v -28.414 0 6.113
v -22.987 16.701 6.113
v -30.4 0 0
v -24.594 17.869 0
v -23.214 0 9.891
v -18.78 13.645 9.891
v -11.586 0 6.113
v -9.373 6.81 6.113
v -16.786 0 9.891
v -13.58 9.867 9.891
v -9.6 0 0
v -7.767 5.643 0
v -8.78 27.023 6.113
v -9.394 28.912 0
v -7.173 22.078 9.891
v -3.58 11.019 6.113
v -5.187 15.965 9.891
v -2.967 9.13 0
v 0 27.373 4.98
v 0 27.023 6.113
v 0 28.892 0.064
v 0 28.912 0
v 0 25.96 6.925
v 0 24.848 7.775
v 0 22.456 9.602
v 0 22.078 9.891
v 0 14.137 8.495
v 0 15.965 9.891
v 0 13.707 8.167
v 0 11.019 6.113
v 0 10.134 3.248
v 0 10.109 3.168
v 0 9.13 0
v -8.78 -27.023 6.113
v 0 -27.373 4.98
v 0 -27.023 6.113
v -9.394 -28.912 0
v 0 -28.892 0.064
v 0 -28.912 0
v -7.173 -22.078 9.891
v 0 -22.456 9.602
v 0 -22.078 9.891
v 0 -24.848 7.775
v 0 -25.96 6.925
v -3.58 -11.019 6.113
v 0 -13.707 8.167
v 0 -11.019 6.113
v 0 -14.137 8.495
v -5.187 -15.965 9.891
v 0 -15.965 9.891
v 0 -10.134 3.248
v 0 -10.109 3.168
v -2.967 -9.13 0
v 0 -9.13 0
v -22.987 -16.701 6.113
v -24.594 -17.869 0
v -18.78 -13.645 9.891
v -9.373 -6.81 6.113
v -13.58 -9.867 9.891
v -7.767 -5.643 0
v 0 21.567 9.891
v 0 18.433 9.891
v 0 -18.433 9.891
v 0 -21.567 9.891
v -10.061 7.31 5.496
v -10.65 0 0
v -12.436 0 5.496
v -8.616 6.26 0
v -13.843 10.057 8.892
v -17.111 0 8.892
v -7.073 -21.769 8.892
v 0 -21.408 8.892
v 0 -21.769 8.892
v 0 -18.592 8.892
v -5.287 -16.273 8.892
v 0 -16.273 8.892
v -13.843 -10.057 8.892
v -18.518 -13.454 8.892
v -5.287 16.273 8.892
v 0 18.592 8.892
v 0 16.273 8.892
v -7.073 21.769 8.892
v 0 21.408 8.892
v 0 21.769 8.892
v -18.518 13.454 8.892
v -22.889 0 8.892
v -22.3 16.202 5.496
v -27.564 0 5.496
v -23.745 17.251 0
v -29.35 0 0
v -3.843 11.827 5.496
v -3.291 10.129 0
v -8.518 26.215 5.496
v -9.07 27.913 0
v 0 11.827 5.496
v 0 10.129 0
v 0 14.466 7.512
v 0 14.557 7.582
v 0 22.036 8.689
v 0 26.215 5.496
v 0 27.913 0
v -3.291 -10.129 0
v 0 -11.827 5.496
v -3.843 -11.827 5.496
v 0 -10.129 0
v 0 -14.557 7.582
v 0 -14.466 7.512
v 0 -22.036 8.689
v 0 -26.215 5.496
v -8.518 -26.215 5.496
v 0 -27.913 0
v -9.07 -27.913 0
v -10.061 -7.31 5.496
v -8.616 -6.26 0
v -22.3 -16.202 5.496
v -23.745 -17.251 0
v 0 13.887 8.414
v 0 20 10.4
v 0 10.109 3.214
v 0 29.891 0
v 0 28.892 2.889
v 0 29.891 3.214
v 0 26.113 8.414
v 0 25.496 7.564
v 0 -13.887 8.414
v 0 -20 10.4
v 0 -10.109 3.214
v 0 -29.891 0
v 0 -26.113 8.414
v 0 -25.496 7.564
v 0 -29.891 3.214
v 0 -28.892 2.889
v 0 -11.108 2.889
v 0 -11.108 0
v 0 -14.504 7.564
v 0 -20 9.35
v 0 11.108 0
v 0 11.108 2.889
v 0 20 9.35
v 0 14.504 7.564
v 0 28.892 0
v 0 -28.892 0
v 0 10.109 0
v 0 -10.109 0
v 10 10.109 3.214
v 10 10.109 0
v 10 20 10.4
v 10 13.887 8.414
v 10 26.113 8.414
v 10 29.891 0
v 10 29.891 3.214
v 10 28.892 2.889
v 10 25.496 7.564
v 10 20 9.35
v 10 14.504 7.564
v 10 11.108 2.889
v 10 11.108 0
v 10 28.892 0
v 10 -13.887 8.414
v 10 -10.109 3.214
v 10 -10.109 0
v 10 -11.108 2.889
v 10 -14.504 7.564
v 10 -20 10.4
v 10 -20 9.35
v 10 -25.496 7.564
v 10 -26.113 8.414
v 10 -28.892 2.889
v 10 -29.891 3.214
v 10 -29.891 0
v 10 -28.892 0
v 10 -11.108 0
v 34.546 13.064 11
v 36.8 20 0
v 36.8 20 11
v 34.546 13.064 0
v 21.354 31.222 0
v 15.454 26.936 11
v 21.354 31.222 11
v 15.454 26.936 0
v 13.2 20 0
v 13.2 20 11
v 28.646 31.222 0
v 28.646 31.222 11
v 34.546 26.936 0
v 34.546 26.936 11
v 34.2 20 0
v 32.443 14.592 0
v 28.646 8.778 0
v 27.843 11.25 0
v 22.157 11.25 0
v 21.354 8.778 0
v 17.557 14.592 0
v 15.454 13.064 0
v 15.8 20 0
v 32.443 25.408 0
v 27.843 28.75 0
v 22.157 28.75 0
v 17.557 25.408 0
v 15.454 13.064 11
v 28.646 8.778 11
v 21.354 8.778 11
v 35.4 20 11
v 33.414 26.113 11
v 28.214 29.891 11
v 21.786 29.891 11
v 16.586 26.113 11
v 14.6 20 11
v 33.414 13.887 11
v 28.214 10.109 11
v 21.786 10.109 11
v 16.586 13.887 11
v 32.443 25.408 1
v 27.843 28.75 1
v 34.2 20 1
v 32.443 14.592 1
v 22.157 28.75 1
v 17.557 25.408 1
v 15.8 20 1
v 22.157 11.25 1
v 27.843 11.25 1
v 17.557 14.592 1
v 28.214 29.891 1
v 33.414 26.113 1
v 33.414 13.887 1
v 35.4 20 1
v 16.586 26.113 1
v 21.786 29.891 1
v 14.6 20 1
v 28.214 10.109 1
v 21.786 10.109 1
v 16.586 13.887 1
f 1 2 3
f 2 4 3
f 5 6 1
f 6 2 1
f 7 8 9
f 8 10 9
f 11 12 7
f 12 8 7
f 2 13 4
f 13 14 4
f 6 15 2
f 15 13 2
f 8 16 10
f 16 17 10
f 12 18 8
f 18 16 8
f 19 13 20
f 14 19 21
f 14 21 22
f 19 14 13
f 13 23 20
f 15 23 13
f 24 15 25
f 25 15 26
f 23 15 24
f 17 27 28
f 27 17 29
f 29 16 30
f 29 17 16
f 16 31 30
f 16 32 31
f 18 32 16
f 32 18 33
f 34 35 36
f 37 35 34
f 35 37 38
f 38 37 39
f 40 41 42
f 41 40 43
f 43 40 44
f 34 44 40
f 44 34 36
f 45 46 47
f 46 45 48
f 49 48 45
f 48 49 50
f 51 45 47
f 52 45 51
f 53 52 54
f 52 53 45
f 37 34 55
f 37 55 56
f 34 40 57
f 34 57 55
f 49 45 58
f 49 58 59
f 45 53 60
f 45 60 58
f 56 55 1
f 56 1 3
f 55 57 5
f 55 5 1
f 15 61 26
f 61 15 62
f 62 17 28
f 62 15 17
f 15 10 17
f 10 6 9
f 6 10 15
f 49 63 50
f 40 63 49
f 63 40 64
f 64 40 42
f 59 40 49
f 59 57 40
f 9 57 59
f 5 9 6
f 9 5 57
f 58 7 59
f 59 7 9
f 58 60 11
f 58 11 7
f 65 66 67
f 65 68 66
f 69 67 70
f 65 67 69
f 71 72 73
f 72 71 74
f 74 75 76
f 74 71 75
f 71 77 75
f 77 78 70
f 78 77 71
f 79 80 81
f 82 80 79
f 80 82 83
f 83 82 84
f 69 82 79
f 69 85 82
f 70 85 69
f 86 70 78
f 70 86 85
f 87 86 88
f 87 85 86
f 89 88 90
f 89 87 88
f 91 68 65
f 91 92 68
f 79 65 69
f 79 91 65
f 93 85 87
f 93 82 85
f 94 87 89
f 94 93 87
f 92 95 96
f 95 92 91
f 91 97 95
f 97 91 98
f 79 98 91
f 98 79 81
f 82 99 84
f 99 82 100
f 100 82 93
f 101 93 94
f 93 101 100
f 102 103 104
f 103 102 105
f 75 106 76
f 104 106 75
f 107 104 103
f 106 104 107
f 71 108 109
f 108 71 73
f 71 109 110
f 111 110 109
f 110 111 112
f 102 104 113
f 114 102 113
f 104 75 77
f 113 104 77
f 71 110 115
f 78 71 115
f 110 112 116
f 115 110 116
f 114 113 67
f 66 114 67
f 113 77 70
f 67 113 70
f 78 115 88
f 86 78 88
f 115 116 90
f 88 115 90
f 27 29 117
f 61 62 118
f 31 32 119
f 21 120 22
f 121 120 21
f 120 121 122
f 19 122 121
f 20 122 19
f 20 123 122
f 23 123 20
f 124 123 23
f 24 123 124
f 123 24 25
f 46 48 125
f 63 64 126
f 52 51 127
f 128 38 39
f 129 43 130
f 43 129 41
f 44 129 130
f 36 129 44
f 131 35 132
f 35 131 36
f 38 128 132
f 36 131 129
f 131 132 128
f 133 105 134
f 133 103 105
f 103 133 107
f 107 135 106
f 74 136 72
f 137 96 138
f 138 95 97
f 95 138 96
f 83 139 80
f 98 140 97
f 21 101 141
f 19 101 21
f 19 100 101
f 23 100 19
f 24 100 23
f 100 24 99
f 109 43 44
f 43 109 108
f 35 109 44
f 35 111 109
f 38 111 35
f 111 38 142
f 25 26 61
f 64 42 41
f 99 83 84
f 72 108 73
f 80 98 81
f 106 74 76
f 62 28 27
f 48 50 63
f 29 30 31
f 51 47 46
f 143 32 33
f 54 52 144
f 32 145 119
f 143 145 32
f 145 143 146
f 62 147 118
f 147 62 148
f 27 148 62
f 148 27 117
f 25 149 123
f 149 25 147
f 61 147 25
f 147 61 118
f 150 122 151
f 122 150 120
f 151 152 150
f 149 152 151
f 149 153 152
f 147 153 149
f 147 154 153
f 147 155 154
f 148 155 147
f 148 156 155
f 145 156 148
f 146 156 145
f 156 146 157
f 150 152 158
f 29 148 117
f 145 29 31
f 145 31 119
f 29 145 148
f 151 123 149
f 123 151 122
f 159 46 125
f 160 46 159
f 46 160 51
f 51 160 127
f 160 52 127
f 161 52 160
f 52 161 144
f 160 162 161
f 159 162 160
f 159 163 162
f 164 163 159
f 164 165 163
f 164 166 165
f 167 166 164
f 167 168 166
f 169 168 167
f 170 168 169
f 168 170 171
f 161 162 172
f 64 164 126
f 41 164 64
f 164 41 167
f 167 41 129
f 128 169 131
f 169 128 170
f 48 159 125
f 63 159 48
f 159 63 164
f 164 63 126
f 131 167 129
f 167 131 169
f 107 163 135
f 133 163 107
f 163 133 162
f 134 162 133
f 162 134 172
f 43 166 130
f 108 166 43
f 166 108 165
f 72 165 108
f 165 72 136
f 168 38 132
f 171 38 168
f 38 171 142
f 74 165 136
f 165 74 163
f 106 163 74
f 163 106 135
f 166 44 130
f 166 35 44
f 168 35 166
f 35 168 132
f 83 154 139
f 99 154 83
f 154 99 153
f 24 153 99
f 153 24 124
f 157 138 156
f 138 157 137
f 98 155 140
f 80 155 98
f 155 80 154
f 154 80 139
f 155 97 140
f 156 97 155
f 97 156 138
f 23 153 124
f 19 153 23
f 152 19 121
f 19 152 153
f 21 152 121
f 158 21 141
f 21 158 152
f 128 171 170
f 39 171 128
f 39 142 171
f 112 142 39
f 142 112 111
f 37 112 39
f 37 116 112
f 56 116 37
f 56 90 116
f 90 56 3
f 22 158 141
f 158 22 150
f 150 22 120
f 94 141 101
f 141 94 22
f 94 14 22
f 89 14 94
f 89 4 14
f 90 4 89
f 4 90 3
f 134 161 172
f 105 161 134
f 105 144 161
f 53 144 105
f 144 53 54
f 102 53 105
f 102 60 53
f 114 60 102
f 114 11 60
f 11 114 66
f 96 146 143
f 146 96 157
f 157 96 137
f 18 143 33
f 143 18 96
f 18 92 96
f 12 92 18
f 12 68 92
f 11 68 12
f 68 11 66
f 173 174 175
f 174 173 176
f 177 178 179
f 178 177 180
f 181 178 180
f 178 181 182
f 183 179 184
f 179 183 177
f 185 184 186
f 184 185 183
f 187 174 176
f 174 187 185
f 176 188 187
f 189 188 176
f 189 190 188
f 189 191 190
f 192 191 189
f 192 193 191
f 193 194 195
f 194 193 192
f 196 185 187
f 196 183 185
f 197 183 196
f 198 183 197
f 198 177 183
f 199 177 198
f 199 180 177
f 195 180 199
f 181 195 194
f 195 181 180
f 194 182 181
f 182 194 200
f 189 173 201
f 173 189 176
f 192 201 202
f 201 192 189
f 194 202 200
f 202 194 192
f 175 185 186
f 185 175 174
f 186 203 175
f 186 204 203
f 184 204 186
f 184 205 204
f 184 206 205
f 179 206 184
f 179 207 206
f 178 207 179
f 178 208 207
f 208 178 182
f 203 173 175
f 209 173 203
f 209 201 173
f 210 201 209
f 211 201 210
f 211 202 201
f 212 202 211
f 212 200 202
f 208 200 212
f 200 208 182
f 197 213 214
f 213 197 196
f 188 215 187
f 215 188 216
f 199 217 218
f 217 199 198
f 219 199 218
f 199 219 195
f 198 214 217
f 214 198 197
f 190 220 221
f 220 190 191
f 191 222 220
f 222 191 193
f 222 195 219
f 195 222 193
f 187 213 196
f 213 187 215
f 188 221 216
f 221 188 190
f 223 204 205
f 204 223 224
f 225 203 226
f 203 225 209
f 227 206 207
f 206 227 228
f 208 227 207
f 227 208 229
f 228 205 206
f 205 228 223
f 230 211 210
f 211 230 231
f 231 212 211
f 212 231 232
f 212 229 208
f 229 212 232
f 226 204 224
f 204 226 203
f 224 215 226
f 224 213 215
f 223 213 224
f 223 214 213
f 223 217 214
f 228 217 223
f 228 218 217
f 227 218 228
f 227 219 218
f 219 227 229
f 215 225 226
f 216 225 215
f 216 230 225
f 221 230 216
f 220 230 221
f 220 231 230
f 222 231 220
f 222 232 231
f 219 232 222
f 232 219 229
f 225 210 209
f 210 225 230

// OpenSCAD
$fn = 10;


inner_r = 18/2+0.2;
wall_min = 1.2;



module blend(){
difference(){ 
union(){
rotate_extrude(convexity = 0)
        translate([20, 0, 0])
        difference (){
                circle(r = inner_r+wall_min);
                circle(r = inner_r+0.15);
        }
}

translate([0,-50,-50]) cube(100);
//translate([-50,0,-50]) cube(100);
}

difference(){
    union(){
        translate([0,20,0])  rotate([0,90,0]) cylinder(r = inner_r+wall_min, h= 10);
        translate([0,-20,0])  rotate([0,90,0]) cylinder(r = inner_r+wall_min, h= 10);
    }
    translate([-2,-20,0])  rotate([0,90,0]) cylinder(r = inner_r+0.15, h= 15);
    translate([-2,20,0])  rotate([0,90,0]) cylinder(r = inner_r+0.15, h= 15);
    
}
}

module splitter(){
    difference(){
        union(){
            cylinder(21, inner_r+wall_min*2+0.2, inner_r+wall_min*2+0.2);
        }
            cylinder(21, inner_r, inner_r);
            cylinder(10, inner_r+wall_min, inner_r+wall_min);
            translate([0,0,10+1]) cylinder(10, inner_r+wall_min, inner_r+wall_min);
    }
}

module end(){
    difference(){
        union(){
            cylinder(11, inner_r+wall_min*2+0.2, inner_r+wall_min*2+0.2);
        }
            cylinder(21, inner_r, inner_r);
            cylinder(10, inner_r+wall_min, inner_r+wall_min);
            //translate([0,0,10+1]) cylinder(10, inner_r+wall_min, inner_r+wall_min);
    }
    
    
}


difference (){ blend(); translate([0,0,-50]) cube(100,100,100, center=true);}
//blend();
//translate([20, 0, 0])splitter();
translate([25, 20, 11]) rotate([0,180,0]) end();
